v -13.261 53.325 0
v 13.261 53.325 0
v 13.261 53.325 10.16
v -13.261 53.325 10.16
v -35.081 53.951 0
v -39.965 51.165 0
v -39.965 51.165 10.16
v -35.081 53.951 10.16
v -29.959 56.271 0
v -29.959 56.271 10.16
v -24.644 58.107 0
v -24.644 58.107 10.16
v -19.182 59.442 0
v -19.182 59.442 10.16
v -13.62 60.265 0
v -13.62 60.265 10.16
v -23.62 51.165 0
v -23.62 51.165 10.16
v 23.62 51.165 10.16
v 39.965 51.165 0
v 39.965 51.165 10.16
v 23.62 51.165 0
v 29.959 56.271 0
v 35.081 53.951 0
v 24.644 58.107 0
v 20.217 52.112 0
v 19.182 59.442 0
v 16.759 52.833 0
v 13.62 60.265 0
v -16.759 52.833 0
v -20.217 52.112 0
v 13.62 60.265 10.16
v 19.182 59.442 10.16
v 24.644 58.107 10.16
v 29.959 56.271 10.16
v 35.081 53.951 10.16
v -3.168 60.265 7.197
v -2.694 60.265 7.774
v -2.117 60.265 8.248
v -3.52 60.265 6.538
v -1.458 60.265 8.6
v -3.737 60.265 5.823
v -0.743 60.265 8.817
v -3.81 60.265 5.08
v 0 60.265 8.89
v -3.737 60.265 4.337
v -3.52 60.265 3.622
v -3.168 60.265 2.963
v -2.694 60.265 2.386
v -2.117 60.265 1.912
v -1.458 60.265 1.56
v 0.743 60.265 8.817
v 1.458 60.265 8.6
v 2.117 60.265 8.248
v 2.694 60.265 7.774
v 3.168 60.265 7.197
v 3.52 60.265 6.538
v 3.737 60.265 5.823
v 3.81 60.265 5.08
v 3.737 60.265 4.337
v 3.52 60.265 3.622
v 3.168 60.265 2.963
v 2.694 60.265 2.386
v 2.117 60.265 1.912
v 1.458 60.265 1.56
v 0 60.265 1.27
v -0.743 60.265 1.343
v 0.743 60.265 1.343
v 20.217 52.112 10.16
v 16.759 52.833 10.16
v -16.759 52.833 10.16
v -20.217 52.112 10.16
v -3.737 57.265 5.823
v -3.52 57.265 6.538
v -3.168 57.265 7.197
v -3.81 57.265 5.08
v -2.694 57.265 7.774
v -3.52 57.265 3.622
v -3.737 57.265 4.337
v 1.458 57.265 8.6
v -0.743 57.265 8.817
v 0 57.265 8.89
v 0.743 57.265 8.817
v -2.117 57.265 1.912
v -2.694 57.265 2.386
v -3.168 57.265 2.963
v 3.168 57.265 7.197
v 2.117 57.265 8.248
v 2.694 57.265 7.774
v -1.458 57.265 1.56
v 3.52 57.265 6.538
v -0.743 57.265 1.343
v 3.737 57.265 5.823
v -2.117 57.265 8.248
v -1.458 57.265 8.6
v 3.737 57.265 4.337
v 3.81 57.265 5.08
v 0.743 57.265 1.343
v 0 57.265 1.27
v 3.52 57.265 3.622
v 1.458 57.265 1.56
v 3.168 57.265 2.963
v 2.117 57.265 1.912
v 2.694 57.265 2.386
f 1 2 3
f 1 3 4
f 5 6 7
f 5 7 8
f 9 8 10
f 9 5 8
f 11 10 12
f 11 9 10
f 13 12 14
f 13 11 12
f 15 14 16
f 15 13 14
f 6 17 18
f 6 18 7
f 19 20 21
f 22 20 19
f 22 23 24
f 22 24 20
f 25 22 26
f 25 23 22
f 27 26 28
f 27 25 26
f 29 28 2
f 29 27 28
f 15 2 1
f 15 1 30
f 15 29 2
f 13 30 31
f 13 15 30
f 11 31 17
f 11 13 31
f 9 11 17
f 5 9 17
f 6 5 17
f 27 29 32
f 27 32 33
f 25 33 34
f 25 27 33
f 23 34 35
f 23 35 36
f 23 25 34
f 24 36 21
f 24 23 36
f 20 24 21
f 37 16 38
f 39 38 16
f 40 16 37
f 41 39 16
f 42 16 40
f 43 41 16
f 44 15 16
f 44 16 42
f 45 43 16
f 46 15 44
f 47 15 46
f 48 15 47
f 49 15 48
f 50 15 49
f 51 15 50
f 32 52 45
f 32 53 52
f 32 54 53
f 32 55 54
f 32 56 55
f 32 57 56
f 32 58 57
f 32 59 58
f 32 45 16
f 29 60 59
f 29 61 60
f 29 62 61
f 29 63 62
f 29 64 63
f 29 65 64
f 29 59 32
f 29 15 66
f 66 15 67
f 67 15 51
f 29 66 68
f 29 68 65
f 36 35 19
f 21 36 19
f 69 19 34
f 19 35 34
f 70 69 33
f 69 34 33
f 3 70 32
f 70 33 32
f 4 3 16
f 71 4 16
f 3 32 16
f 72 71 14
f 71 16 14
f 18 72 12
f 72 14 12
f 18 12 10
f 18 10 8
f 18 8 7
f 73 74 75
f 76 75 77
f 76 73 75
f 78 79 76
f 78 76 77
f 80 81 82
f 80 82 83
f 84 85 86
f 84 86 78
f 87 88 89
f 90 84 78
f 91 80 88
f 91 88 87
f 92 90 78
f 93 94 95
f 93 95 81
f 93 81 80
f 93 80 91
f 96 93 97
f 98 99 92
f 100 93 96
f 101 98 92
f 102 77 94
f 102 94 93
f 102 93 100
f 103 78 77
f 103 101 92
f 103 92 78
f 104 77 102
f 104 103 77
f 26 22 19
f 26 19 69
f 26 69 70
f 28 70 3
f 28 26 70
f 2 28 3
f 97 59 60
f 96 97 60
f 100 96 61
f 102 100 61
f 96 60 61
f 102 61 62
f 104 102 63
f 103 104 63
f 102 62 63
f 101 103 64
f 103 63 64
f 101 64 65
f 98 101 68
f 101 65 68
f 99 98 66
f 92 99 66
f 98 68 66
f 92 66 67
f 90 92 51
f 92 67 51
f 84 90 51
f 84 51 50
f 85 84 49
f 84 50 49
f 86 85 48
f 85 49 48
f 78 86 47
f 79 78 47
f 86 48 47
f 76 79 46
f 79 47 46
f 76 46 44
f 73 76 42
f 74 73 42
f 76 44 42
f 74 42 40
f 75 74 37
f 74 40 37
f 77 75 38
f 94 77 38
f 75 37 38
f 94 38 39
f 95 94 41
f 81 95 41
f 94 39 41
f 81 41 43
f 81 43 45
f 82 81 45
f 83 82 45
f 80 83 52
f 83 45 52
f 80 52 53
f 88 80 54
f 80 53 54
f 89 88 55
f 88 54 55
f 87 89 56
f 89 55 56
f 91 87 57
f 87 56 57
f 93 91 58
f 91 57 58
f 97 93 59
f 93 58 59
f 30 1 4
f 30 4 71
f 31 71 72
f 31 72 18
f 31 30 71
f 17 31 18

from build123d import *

# Parameters (mm, degrees)
BOSS_EXTRUDE1_DEPTH = 10.16
SKETCH2_R           = 3.81
CUT_EXTRUDE1_DEPTH  = 3


with BuildPart() as part:
    # Sketch1 → Boss-Extrude1 (new body)
    with BuildSketch(Plane.XY):
        with BuildLine():
            Line((-13.62, 60.264846167), (13.62, 60.264846167))
            ThreePointArc((13.62, 60.264846167), (27.323058228, 57.250841389), (39.965, 51.164846167))
            Line((39.965, 51.164846167), (23.620484036, 51.164846167))
            ThreePointArc((23.620484036, 51.164846167), (18.493954537, 52.501006754), (13.260607764, 53.324846167))
            Line((13.260607764, 53.324846167), (-13.260607764, 53.324846167))
            ThreePointArc((-13.260607764, 53.324846167), (-18.493954537, 52.501006754), (-23.620484036, 51.164846167))
            Line((-23.620484036, 51.164846167), (-39.965, 51.164846167))
            ThreePointArc((-39.965, 51.164846167), (-27.323058228, 57.250841389), (-13.62, 60.264846167))
        make_face()
    extrude(amount=BOSS_EXTRUDE1_DEPTH)

    # Sketch2 → Cut-Extrude1 (cut)
    with BuildSketch(Plane(origin=(0, 60.264846167, 0), x_dir=(1, 0, 0), z_dir=(0, 1, 0))):
        with Locations((0, -5.08)):
            Circle(SKETCH2_R)
    extrude(amount=-CUT_EXTRUDE1_DEPTH, mode=Mode.SUBTRACT)


solid = part.part
